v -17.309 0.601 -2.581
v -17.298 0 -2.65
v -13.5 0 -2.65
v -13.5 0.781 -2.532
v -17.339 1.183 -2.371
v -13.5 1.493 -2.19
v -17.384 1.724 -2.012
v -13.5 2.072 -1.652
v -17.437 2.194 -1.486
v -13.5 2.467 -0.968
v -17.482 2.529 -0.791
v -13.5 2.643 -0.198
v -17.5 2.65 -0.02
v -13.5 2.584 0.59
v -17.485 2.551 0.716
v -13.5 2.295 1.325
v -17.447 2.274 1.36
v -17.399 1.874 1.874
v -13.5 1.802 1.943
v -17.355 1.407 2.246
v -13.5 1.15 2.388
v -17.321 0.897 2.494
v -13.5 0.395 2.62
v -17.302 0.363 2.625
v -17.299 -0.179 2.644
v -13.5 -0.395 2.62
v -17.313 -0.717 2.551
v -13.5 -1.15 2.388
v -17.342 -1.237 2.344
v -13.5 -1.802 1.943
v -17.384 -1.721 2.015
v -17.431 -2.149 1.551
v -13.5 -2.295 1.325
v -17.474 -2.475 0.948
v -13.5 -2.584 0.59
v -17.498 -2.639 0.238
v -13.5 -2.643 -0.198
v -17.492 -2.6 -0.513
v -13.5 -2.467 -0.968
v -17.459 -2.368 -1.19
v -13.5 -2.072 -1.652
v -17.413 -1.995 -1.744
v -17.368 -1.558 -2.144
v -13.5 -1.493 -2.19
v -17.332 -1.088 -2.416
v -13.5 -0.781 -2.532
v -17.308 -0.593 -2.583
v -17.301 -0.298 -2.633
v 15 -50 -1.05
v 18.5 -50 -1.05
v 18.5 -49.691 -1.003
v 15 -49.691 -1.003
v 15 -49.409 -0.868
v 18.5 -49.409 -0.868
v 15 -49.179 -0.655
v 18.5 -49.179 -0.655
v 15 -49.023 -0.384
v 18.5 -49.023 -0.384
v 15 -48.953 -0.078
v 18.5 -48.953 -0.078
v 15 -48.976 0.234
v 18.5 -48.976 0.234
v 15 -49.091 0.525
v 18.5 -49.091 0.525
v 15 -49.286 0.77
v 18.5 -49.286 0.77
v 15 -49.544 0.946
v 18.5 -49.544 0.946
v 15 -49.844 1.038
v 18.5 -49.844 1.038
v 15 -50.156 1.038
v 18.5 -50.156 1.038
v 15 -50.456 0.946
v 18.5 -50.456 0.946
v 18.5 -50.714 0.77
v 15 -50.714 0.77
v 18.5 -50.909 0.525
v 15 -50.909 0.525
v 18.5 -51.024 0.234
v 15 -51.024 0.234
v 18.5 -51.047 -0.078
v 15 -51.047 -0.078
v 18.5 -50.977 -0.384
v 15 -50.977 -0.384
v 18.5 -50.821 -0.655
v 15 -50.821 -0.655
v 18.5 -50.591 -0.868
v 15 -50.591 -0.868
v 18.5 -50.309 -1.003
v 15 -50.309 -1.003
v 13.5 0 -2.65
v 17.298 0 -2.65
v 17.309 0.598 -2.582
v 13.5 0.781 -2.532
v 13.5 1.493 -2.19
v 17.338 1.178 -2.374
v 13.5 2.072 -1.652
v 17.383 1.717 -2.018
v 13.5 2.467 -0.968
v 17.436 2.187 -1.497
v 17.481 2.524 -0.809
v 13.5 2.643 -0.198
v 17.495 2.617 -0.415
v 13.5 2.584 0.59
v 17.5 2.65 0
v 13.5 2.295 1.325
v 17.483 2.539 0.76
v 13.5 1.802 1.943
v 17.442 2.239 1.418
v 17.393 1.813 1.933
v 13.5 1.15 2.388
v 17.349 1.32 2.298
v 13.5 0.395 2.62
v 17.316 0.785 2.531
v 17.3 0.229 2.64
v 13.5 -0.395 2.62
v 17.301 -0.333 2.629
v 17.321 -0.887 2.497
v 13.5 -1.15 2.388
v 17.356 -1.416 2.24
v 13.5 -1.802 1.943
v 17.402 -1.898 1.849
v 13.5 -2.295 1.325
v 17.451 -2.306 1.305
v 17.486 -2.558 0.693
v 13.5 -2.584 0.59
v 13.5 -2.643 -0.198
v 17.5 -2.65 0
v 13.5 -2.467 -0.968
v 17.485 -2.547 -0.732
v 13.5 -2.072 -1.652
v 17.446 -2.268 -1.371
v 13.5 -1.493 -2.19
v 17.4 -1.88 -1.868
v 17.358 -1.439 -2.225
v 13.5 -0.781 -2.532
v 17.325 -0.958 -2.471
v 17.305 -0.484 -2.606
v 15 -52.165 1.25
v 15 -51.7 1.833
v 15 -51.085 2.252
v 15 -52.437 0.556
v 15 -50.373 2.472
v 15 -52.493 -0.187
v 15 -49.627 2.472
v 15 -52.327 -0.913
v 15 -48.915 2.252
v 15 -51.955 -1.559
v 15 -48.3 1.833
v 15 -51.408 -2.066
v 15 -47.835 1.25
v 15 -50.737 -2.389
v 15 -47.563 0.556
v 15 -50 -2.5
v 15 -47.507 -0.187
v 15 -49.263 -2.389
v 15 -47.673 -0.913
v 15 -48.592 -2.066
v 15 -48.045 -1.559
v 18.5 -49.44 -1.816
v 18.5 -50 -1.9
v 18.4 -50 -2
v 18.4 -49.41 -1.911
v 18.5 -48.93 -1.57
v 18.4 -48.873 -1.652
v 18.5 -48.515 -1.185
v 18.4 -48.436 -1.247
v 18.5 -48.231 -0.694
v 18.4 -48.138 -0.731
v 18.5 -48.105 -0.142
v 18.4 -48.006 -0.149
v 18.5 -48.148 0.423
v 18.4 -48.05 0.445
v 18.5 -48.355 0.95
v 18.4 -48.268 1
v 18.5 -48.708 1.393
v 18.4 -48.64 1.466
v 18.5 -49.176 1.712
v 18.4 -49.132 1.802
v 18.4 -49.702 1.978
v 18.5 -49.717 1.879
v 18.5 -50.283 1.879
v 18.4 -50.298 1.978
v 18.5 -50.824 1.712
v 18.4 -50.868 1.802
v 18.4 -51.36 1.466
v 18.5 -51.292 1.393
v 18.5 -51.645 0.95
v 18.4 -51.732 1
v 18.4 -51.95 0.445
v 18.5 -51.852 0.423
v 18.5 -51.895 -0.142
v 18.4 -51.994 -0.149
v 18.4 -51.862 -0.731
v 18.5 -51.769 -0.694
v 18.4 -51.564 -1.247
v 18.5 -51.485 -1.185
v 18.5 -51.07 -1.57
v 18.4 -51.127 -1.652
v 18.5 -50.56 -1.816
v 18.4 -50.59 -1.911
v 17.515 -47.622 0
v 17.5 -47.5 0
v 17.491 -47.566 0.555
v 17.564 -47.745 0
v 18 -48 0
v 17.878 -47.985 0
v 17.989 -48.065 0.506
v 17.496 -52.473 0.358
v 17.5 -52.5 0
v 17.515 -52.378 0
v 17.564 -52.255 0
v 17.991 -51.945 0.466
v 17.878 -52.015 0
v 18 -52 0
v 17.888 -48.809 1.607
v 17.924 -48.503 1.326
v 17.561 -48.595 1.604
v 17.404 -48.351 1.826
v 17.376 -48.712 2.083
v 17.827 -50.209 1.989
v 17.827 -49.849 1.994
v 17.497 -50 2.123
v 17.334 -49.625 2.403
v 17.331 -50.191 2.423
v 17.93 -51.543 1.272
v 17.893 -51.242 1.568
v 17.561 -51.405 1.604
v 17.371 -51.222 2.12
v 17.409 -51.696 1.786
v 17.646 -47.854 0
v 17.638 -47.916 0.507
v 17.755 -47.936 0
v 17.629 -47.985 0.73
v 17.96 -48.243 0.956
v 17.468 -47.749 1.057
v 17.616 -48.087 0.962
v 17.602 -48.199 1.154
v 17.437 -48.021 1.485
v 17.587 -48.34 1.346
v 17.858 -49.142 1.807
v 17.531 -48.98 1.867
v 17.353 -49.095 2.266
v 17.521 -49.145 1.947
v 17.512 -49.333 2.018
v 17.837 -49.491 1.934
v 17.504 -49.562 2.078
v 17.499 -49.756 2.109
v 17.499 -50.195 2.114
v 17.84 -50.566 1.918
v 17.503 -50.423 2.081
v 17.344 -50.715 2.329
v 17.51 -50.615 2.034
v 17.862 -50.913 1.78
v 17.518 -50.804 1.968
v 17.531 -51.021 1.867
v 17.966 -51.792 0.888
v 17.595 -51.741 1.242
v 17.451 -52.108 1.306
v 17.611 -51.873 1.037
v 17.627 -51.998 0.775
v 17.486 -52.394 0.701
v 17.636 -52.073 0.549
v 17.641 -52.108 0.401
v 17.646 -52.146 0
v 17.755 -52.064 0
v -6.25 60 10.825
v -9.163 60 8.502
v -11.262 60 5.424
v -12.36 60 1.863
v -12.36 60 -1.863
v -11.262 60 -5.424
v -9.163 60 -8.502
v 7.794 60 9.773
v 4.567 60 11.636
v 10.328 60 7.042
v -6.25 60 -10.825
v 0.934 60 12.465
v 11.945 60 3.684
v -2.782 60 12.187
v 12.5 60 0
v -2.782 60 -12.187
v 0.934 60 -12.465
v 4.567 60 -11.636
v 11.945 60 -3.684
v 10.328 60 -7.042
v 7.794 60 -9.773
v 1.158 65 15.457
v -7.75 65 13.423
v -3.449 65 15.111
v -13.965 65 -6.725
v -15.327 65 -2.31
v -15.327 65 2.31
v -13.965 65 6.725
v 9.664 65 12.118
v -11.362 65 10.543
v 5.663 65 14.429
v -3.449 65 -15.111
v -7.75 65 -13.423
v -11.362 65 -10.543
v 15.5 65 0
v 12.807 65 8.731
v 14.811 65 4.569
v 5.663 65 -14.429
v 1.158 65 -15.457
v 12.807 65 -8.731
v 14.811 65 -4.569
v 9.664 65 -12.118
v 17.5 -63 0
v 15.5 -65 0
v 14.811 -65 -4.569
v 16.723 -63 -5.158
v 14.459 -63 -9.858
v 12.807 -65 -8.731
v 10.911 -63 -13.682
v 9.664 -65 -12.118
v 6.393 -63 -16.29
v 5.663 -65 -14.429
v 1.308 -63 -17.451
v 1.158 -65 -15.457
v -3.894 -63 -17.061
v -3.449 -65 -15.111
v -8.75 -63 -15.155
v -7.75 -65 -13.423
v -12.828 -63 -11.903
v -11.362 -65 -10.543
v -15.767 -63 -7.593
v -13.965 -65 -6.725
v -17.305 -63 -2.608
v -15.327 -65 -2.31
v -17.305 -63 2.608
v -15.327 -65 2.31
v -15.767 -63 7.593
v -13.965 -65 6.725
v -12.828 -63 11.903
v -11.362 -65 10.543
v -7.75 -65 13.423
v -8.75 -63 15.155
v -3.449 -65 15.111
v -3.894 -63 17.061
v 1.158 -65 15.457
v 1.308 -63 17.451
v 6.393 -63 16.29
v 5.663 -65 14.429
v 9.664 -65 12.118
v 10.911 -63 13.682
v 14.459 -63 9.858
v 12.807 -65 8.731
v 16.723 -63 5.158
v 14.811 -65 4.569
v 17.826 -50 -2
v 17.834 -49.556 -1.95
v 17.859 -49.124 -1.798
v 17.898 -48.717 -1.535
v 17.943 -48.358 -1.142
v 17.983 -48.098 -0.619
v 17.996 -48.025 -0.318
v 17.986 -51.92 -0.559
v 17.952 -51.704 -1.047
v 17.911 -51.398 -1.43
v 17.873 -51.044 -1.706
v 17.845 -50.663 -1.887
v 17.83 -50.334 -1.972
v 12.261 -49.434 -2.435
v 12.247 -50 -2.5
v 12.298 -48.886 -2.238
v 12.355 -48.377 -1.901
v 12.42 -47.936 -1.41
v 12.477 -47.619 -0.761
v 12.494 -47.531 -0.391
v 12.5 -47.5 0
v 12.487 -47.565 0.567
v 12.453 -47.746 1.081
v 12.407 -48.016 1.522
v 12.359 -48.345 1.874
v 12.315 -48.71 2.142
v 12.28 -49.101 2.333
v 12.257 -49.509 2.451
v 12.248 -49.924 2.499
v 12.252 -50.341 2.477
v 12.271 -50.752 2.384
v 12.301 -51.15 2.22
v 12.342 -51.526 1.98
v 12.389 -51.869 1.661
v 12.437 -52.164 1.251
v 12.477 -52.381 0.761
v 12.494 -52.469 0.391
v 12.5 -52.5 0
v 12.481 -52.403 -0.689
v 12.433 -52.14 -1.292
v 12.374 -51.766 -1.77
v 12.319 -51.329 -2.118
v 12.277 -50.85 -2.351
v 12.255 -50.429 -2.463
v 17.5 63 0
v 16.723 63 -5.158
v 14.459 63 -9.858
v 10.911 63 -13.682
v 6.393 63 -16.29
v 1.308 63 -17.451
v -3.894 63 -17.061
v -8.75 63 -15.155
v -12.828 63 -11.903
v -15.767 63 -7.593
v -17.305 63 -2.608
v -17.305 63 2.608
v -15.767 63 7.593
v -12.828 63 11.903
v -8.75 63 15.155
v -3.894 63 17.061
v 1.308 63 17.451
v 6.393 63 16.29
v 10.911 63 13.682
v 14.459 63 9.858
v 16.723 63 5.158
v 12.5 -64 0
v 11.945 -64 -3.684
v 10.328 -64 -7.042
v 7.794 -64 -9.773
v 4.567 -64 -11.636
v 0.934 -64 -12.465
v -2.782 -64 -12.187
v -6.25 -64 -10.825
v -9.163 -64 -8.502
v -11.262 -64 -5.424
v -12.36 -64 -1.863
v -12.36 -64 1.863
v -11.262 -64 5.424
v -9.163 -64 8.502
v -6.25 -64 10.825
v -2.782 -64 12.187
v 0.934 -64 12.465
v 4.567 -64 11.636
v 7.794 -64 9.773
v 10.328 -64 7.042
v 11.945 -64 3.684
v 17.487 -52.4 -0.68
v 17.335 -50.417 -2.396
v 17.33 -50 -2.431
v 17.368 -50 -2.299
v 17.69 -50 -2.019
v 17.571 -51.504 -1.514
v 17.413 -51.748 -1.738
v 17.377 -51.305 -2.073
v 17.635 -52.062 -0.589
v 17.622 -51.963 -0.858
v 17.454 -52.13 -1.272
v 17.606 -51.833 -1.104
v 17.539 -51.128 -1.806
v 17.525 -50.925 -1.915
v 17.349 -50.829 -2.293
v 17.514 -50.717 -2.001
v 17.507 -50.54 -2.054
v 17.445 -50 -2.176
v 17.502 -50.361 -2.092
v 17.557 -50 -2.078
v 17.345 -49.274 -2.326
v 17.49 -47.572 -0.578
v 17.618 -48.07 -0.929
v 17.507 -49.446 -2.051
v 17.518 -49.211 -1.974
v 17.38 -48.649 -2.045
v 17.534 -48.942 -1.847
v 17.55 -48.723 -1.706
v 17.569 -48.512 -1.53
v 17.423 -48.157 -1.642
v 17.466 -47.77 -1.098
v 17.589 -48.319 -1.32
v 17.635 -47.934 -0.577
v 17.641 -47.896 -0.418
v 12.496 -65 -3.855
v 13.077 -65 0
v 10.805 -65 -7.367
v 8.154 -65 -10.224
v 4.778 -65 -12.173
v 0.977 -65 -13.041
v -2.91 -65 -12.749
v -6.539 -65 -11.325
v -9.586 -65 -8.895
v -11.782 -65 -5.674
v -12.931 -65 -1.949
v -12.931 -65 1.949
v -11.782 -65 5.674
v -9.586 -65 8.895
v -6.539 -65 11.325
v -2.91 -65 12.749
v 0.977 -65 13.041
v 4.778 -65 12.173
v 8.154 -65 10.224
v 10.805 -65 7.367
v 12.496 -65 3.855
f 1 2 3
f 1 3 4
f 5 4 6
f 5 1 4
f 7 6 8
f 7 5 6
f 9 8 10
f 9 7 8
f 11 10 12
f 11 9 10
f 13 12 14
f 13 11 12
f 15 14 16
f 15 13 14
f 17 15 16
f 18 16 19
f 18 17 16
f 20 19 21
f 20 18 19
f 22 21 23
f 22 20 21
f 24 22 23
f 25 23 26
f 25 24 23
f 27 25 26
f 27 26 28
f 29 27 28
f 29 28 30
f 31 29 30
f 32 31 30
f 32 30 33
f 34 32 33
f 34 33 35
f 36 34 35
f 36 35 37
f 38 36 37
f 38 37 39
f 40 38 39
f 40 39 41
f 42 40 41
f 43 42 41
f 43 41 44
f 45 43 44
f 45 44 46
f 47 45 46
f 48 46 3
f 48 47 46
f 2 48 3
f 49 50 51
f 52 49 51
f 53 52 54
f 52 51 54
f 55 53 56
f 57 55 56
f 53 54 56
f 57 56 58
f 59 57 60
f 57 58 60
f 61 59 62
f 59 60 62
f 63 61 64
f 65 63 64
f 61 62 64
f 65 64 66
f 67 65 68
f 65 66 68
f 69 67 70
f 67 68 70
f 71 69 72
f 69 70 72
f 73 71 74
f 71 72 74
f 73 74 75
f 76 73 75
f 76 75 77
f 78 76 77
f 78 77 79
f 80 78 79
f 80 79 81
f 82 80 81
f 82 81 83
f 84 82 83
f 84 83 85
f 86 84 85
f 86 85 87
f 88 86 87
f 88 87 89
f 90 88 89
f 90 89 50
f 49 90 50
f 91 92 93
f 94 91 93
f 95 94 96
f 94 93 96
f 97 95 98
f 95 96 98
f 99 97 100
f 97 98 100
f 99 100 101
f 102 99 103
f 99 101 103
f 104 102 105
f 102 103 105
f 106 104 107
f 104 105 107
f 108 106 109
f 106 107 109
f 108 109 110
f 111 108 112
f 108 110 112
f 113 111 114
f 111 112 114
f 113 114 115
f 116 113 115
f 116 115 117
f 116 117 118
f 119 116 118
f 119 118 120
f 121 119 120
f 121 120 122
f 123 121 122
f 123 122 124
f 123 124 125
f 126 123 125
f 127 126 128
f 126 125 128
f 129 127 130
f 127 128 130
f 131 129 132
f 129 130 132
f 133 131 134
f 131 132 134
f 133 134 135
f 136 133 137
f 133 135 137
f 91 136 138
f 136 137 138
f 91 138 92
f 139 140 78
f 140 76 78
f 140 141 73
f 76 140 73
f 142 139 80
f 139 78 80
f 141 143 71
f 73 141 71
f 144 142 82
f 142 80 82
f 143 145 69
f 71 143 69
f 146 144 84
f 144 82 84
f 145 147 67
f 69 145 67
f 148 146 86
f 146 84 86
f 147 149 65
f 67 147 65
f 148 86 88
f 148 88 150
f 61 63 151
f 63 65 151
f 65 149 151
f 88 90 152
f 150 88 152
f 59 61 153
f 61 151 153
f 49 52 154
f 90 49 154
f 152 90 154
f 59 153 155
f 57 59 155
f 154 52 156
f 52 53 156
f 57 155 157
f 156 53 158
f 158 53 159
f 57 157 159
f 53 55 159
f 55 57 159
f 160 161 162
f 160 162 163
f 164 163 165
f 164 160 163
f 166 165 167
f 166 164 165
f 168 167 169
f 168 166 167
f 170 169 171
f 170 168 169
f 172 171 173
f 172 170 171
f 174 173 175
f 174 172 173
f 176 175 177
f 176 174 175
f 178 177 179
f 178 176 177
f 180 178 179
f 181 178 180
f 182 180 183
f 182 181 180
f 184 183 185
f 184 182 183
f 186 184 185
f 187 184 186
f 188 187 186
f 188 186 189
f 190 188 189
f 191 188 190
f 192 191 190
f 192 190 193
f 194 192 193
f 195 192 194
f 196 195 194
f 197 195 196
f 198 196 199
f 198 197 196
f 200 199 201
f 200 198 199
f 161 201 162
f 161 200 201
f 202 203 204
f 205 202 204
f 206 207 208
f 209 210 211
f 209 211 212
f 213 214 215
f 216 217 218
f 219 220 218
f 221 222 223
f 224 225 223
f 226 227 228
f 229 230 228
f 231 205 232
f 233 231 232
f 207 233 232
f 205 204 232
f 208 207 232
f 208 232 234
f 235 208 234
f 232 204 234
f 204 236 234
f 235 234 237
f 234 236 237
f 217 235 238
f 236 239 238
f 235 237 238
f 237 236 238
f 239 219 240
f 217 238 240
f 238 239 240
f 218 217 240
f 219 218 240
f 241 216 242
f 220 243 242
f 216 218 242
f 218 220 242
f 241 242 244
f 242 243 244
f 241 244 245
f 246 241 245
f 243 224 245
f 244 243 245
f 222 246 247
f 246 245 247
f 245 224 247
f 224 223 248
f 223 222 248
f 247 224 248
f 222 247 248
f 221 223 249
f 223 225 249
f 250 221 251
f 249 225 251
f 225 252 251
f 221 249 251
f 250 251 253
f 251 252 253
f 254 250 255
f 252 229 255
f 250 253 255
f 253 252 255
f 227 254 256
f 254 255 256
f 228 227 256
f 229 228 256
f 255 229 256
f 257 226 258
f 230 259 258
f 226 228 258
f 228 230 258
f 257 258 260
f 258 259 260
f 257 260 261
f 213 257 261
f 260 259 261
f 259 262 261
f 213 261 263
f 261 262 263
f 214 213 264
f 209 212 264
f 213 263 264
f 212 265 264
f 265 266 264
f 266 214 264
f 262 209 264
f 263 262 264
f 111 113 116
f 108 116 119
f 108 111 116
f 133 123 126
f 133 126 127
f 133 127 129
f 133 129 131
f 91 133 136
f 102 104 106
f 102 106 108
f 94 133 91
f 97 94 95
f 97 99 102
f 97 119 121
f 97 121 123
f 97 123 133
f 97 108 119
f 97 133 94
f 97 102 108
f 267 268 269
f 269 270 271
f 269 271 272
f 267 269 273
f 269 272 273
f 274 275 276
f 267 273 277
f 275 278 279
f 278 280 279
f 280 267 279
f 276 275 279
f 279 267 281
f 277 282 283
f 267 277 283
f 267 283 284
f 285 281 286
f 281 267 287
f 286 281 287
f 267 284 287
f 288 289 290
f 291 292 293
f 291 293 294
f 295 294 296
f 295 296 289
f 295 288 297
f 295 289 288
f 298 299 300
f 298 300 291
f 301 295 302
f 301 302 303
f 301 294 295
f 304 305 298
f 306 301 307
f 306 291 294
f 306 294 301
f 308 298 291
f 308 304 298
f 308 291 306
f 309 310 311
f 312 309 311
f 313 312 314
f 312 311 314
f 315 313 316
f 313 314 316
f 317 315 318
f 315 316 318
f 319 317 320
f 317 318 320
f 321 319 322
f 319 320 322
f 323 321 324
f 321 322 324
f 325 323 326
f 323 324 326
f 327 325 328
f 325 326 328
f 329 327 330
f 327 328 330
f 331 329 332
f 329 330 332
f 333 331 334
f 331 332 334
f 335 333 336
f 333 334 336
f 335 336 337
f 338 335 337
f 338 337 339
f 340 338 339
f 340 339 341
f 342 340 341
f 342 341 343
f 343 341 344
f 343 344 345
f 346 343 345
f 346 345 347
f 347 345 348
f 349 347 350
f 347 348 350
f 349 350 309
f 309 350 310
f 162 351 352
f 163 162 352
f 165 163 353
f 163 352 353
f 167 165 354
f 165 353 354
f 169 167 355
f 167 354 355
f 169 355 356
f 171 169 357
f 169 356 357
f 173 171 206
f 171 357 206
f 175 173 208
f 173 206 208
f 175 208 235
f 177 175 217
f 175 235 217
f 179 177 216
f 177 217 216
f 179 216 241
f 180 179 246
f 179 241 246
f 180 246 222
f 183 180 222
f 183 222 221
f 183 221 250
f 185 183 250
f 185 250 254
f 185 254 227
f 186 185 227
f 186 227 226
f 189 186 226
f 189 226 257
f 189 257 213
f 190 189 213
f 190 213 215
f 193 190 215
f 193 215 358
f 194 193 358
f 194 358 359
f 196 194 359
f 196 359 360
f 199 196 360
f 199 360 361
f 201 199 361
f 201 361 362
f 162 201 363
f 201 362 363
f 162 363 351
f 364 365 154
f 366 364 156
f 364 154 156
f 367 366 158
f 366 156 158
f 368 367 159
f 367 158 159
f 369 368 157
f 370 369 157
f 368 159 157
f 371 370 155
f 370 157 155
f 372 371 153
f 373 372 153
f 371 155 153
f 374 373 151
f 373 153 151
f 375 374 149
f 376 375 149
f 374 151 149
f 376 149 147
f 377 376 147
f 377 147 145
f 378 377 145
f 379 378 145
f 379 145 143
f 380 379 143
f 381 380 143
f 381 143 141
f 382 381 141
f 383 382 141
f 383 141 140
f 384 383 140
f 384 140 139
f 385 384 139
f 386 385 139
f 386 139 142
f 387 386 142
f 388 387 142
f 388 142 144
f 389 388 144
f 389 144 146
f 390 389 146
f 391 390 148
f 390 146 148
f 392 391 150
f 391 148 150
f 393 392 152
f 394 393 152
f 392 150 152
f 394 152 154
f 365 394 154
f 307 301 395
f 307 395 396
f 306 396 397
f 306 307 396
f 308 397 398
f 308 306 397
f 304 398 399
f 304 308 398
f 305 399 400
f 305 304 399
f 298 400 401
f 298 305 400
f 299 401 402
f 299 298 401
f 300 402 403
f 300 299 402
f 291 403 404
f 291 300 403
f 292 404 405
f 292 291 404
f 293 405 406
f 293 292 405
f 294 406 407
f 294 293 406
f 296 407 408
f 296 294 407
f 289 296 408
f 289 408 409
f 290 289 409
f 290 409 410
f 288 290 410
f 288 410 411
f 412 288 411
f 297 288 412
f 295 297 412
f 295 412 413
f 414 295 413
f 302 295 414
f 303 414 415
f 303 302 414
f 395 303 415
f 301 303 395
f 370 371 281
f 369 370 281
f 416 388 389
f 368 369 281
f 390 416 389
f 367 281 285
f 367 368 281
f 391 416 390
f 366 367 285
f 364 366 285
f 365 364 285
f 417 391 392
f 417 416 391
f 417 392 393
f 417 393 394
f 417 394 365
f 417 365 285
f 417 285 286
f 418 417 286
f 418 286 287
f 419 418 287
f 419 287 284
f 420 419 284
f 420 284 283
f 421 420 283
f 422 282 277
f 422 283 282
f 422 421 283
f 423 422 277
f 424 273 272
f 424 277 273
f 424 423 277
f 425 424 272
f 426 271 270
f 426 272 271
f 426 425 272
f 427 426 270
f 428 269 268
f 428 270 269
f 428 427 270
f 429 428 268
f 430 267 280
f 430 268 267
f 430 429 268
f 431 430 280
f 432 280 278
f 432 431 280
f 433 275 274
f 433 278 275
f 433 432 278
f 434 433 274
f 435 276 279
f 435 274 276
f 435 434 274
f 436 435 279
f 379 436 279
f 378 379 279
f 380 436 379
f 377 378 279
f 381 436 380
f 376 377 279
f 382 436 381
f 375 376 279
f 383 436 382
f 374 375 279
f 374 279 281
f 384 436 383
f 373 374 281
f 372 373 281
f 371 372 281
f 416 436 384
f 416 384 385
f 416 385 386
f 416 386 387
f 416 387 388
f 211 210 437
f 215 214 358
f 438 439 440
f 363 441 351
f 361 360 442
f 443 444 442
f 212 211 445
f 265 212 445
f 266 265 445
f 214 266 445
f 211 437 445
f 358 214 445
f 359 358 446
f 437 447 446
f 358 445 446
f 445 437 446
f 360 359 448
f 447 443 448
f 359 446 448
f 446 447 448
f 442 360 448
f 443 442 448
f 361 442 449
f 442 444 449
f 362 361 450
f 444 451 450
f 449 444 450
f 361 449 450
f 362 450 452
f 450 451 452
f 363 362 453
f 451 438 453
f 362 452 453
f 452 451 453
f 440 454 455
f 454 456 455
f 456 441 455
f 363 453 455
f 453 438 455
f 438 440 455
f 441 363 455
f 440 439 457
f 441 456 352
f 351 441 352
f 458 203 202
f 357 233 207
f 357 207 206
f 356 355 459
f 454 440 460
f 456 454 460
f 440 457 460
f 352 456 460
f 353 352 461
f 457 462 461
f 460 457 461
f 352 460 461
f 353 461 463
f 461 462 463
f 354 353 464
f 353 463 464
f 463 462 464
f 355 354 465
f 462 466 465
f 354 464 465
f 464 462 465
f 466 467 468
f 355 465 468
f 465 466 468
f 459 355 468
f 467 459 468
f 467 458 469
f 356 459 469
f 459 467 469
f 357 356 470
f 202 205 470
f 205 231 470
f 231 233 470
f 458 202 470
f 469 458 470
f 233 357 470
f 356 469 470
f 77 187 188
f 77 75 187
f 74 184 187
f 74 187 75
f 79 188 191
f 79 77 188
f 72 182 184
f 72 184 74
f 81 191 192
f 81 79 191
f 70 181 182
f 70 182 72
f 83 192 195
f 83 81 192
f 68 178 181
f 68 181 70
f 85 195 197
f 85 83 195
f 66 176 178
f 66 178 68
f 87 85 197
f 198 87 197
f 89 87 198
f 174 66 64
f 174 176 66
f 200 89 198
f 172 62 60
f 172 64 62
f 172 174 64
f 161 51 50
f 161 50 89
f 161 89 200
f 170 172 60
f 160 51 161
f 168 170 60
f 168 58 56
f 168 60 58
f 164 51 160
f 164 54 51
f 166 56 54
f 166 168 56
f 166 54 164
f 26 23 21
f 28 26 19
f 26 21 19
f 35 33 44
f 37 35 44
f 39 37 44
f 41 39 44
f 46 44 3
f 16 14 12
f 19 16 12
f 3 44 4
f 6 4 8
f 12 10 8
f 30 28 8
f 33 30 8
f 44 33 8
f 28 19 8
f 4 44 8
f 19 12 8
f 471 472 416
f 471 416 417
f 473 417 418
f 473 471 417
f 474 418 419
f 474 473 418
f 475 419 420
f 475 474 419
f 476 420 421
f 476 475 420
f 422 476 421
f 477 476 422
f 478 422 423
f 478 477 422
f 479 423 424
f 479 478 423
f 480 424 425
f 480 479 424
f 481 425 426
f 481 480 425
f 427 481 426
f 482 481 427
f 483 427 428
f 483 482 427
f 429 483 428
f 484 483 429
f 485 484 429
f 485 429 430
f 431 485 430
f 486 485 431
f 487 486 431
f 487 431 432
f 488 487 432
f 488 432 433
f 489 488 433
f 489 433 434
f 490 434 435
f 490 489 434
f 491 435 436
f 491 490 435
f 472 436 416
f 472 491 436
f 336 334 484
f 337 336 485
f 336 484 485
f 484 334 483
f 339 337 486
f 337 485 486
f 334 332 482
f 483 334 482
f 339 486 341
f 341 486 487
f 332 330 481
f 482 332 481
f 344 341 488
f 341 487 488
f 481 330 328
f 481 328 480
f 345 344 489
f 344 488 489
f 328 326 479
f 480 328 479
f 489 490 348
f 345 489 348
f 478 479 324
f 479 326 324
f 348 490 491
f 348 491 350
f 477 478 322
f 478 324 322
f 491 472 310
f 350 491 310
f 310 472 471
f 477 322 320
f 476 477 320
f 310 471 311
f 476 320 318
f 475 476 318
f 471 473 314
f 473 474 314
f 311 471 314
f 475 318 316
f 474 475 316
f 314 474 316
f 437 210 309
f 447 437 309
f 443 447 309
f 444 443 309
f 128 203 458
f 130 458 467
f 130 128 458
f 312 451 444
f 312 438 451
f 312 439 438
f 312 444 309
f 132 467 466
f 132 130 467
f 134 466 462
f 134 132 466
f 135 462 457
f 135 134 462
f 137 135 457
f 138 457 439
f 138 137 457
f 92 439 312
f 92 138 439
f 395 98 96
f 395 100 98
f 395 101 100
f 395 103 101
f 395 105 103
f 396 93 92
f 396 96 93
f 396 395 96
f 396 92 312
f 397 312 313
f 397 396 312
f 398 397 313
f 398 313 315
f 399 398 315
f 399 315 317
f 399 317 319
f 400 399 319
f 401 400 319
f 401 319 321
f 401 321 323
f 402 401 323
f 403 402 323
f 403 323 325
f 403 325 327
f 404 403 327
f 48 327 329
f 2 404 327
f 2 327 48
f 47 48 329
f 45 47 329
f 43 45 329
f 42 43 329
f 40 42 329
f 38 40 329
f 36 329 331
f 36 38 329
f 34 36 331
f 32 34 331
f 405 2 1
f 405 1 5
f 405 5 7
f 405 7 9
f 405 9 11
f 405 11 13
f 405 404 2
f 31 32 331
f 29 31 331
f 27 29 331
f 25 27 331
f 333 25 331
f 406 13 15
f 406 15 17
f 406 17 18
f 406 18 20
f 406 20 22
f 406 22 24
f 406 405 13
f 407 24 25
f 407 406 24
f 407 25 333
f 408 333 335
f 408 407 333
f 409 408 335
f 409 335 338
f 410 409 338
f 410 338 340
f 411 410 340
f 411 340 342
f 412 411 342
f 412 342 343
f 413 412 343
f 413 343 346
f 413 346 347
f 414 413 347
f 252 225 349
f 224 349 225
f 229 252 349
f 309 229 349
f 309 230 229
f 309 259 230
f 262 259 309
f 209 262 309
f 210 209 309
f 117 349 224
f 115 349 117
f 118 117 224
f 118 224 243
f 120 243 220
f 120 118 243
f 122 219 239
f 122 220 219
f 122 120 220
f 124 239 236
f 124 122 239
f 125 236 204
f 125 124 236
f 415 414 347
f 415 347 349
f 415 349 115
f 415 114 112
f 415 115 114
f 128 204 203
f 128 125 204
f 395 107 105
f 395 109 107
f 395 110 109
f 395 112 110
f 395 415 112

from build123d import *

# Parameters (mm, degrees)
ESQUISSE1_R             = 17.5
ESQUISSE1_R_2           = 12.5
BOSS_EXTRU_1_DEPTH      = 65
ESQUISSE3_R             = 2.65
ENL_V_MAT_EXTRU_1_DEPTH = 4
ESQUISSE4_R             = 2
BOSS_EXTRU_2_DEPTH      = 1
BOSS_EXTRU_2_DEPTH_BACK = 2
ENL_V_MAT_EXTRU_2_REACH = 38
ESQUISSE5_R             = 1.05
ENL_V_START             = -3.5
ESQUISSE6_R             = 2.5
ENL_V_MAT_EXTRU_3_DEPTH = 5
CONG_1_R                = 0.5
CHANFREIN1_SIZE         = 0.1
ESQUISSE7_R             = 17.5
BOSS_EXTRU_3_DEPTH      = 5
CHANFREIN2_SIZE         = 2
CHANFREIN3_SIZE         = 1
CHANFREIN3_SIZE2        = 0.577350269


with BuildPart() as part:
    # Esquisse1 → Boss.-Extru.1 (new body, symmetric)
    with BuildSketch(Plane(origin=(0, 0, 0), x_dir=(1, 0, 0), z_dir=(0, 1, 0))):
        Circle(ESQUISSE1_R)
        Circle(ESQUISSE1_R_2, mode=Mode.SUBTRACT)
    extrude(amount=BOSS_EXTRU_1_DEPTH, both=True)

    # Esquisse3 → Enlèv. mat.-Extru.1 (cut)
    with BuildSketch(Plane(origin=(17.5, 0, 0), x_dir=(0, 0, -1), z_dir=(1, 0, 0))):
        Circle(ESQUISSE3_R)
    enl_v_mat_extru_1 = extrude(amount=-ENL_V_MAT_EXTRU_1_DEPTH, mode=Mode.SUBTRACT)

    # Symétrie1: Enlèv. mat.-Extru.1 across plane
    add(enl_v_mat_extru_1.mirror(Plane(origin=(0, 0, 0), x_dir=(0, 0, 1), z_dir=(1, 0, 0))), mode=Mode.SUBTRACT)

    # Esquisse4 → Boss.-Extru.2 (add, two sides)
    with BuildSketch(Plane(origin=(17.5, 0, 0), x_dir=(0, 0, -1), z_dir=(1, 0, 0))) as boss_extru_2_sk:
        with Locations((0, -50)):
            Circle(ESQUISSE4_R)
    extrude(amount=BOSS_EXTRU_2_DEPTH)
    extrude(boss_extru_2_sk.sketch, amount=-BOSS_EXTRU_2_DEPTH_BACK)

    # Esquisse5 → Enlèv. mat.-Extru.2 (cut, up to next)
    with BuildSketch(Plane(origin=(18.5, 0, 0), x_dir=(0, 0, -1), z_dir=(1, 0, 0)), mode=Mode.PRIVATE) as enl_v_mat_extru_2_sk1:
        with Locations((0, -50)):
            Circle(ESQUISSE5_R)
    enl_v_mat_extru_2_tool1 = extrude(enl_v_mat_extru_2_sk1.sketch, amount=-ENL_V_MAT_EXTRU_2_REACH, mode=Mode.PRIVATE) & part.part
    add(enl_v_mat_extru_2_tool1.solids().sort_by_distance((18.5, -50, 0))[0], mode=Mode.SUBTRACT)

    # Esquisse6 → Enlèv. mat.-Extru.3 (cut)
    with BuildSketch(Plane(origin=(18.5, 0, 0), x_dir=(0, 0, -1), z_dir=(1, 0, 0)).offset(ENL_V_START)):
        with Locations((0, -50)):
            Circle(ESQUISSE6_R)
    extrude(amount=-ENL_V_MAT_EXTRU_3_DEPTH, mode=Mode.SUBTRACT)

    # Congé1
    cong_1_edges = [part.edges().sort_by_distance(p)[0] for p in [
        (17.385338651, -50, 2),
    ]]
    fillet(cong_1_edges, radius=CONG_1_R)

    # Chanfrein1
    chanfrein1_edges = [part.edges().sort_by_distance(p)[0] for p in [
        (18.5, -50, 2),
    ]]
    chamfer(chanfrein1_edges, length=CHANFREIN1_SIZE)

    # Esquisse7 → Boss.-Extru.3 (add)
    with BuildSketch(Plane(origin=(0, 65, 0), x_dir=(1, 0, 0), z_dir=(0, 1, 0))):
        Circle(ESQUISSE7_R)
    extrude(amount=-BOSS_EXTRU_3_DEPTH)

    # Chanfrein2
    chanfrein2_edges = [part.edges().sort_by_distance(p)[0] for p in [
        (-17.5, -65, 0),
        (-17.5, 65, 0),
    ]]
    chamfer(chanfrein2_edges, length=CHANFREIN2_SIZE)

    # Chanfrein3
    chanfrein3_edges = [part.edges().sort_by_distance(p)[0] for p in [
        (-12.5, -65, 0),
    ]]
    chanfrein3_side = [part.faces().sort_by_distance(p)[0] for p in [
        (-12.5, -2.5, 0),
    ]]
    chamfer(chanfrein3_edges, length=CHANFREIN3_SIZE, length2=CHANFREIN3_SIZE2, reference=chanfrein3_side[0])


solid = part.part
